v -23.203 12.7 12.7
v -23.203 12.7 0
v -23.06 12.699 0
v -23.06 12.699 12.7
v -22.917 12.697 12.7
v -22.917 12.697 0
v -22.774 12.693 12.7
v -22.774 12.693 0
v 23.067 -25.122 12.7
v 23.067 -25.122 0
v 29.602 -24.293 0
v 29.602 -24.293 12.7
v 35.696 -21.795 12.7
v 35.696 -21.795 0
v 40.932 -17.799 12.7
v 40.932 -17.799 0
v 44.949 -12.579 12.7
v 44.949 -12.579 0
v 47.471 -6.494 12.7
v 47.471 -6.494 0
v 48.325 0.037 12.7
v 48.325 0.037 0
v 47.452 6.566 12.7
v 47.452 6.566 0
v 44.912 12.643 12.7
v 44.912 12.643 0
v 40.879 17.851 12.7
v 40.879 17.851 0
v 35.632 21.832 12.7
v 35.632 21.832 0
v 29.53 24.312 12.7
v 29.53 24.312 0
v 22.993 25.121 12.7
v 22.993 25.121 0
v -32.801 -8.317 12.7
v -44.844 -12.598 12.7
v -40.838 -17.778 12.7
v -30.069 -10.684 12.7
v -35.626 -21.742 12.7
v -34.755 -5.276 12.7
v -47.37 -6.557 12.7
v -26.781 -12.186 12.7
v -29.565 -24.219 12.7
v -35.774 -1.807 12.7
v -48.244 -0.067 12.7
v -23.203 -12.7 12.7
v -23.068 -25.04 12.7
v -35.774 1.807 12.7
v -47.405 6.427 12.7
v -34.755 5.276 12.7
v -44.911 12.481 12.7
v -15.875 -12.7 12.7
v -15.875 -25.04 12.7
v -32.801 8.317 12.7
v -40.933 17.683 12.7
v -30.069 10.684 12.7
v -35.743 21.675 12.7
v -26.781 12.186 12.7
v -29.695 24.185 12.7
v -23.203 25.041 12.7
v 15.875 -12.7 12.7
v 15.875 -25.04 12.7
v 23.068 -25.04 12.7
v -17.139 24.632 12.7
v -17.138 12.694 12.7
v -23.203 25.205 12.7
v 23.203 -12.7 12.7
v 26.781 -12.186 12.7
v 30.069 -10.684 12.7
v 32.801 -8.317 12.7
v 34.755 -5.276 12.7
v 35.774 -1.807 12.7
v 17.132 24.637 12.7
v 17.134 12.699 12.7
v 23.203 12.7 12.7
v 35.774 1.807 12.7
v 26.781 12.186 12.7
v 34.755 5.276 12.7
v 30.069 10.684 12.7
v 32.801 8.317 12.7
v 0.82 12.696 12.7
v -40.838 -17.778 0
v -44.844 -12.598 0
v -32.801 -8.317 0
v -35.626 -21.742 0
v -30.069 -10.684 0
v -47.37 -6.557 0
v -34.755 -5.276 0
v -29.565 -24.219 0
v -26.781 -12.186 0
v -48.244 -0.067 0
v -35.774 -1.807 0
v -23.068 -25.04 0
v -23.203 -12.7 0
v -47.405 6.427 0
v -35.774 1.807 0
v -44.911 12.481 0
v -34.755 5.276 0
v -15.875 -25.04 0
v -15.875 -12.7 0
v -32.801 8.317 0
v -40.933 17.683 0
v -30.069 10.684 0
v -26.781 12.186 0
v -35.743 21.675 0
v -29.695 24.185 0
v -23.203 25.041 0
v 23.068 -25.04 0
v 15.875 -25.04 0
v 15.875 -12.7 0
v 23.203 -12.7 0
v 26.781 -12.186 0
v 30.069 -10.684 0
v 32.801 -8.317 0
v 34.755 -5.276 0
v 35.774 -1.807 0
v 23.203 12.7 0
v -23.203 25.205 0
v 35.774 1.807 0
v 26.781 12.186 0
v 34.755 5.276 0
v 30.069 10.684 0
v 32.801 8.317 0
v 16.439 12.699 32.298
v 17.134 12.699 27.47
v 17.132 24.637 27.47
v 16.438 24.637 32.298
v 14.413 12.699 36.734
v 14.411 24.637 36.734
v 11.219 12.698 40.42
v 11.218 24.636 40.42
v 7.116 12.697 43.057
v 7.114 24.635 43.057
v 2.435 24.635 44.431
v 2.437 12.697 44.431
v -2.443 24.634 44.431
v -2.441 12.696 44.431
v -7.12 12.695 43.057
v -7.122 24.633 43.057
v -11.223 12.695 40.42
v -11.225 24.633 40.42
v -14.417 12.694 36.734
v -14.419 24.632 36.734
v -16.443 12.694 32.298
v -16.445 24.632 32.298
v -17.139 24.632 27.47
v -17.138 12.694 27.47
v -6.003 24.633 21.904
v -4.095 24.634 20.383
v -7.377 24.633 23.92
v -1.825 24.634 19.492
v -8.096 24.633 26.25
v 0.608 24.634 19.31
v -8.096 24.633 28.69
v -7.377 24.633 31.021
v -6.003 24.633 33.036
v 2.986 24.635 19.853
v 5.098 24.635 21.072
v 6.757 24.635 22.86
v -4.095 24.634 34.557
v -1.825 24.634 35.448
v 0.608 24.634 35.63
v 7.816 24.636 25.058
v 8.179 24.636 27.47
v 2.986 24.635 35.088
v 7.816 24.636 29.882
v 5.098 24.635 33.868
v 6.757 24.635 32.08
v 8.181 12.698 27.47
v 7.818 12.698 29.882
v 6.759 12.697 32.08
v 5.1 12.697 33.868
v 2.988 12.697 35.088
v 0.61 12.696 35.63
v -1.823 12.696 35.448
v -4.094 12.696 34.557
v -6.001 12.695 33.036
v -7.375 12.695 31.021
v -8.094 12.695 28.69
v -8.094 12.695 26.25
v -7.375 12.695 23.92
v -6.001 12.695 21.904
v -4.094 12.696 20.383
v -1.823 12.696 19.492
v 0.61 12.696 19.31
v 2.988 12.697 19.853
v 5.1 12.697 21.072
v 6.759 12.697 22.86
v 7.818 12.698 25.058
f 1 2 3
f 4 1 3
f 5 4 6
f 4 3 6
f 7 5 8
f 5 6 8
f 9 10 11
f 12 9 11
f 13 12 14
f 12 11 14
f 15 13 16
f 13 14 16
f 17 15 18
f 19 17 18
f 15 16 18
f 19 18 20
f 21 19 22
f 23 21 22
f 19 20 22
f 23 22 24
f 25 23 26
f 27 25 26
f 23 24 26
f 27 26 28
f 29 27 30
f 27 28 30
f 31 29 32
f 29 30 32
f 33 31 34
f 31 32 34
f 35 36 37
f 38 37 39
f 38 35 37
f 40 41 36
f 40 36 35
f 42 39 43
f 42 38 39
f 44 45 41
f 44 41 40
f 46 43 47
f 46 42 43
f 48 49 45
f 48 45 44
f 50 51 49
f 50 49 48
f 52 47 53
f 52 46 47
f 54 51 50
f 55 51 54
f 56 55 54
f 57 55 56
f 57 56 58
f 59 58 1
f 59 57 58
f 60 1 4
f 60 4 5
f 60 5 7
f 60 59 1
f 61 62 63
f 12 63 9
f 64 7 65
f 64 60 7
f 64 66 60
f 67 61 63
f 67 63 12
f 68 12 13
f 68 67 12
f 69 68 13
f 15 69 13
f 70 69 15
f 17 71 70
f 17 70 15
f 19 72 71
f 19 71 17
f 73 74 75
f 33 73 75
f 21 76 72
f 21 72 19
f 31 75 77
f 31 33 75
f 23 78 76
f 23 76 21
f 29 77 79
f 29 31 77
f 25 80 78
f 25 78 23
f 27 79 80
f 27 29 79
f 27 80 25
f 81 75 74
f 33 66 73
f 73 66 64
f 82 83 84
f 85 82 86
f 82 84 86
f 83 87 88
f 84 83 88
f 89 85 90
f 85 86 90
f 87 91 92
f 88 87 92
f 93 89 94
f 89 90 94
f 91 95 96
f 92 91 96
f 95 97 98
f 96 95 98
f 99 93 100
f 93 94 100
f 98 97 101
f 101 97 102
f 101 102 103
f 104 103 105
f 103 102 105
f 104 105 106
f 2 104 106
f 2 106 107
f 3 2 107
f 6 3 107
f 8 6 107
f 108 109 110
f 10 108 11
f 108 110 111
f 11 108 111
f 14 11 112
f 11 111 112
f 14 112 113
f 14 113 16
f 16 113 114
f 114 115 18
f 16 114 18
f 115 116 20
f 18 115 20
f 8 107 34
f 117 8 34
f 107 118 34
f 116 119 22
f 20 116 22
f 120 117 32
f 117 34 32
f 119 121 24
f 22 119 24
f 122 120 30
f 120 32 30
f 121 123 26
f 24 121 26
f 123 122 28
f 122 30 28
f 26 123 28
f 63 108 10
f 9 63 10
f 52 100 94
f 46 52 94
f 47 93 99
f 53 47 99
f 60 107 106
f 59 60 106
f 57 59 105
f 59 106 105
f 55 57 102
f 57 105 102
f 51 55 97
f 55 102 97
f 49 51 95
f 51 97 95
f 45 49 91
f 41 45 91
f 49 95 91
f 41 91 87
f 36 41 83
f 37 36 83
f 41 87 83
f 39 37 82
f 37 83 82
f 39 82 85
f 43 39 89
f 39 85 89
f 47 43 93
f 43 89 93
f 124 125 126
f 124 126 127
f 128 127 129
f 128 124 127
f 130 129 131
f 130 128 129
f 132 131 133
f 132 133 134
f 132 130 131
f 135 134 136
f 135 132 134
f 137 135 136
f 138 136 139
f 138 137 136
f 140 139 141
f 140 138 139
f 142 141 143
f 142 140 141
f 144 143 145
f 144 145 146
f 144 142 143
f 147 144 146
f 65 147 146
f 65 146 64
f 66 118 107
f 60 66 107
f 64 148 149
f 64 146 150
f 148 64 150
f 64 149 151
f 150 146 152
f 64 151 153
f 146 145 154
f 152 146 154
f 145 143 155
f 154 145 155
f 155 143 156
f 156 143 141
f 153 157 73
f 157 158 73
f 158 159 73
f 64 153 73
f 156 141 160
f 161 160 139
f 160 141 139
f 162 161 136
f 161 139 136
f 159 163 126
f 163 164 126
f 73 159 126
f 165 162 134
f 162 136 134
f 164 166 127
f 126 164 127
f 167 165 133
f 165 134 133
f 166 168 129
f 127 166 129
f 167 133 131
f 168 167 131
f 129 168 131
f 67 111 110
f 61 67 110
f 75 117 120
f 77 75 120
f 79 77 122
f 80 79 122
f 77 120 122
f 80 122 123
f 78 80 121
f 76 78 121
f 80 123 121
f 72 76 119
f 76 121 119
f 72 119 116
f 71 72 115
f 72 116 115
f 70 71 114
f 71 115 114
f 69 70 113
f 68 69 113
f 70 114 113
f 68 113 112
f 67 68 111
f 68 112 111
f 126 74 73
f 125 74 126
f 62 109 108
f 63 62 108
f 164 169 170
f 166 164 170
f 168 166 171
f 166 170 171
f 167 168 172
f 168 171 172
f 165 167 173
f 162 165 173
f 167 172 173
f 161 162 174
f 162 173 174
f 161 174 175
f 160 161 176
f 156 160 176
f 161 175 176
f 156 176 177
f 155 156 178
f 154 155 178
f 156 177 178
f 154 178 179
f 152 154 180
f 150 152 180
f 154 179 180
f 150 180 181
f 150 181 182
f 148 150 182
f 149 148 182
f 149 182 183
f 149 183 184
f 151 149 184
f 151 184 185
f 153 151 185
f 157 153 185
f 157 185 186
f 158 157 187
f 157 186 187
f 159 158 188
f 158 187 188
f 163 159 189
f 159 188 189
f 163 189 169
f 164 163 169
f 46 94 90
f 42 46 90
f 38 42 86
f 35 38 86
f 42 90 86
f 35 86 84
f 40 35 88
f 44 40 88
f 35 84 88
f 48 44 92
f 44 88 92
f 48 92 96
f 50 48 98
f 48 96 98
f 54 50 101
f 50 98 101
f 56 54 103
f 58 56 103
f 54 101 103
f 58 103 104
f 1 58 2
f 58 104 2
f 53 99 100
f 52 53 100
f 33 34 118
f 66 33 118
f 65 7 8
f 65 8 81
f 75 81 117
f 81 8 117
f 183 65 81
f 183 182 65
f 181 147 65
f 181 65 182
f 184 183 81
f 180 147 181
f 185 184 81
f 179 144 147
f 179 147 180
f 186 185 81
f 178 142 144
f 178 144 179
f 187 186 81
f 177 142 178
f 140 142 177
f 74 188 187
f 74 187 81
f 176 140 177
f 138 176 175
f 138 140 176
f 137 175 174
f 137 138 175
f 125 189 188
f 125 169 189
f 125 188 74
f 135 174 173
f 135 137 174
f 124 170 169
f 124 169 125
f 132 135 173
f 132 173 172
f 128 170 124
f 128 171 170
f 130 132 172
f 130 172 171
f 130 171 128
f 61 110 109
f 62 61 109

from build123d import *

# Parameters (mm, degrees)
F1_DEPTH = 12.7
F2_R     = 8.183106
F3_DEPTH = 11.938


with BuildPart() as f1:
    # F0 (on Top) → F1 (new body)
    with BuildSketch(Plane.XY):
        with BuildLine():
            ThreePointArc((-23.2029, -12.7), (-35.9029, 0), (-23.2029, 12.7))
            Line((-23.2029, 12.7), (-23.2029, 25.040741))
            ThreePointArc((-23.2029, 25.040741), (-48.24355, -0.067309), (-23.068282, -25.040379))
            Line((-23.068282, -25.040379), (-15.875, -25.040379))
            Line((-15.875, -25.040379), (-15.875, -12.7))
            Line((-15.875, -12.7), (-23.2029, -12.7))
        make_face()
        with BuildLine():
            Line((-22.774086, 12.692759), (23.2029, 12.7))
            Line((23.2029, 12.7), (22.993142, 25.1211))
            Line((22.993142, 25.1211), (-23.2029, 25.204616))
            Line((-23.2029, 25.204616), (-23.2029, 25.040741))
            Line((-23.2029, 25.040741), (-23.2029, 12.7))
            ThreePointArc((-23.2029, 12.7), (-22.988463, 12.69819), (-22.774086, 12.692759))
        make_face()
        with BuildLine():
            ThreePointArc((23.2029, 12.7), (35.9029, 0), (23.2029, -12.7))
            Line((23.2029, -12.7), (15.875, -12.7))
            Line((15.875, -12.7), (15.875, -25.040379))
            Line((15.875, -25.040379), (23.068282, -25.040379))
            Line((23.068282, -25.040379), (23.067396, -25.12161))
            ThreePointArc((23.067396, -25.12161), (48.324848, 0.037128), (22.993142, 25.1211))
            Line((22.993142, 25.1211), (23.2029, 12.7))
        make_face()
    extrude(amount=F1_DEPTH)

    # F2 (on face) → F3 (join)
    with BuildSketch(Plane(origin=(-0.002, 12.696345, 0), x_dir=(1, 0.000158, 0), z_dir=(0.000158, -1, 0))):
        with BuildLine():
            Line((17.135601, 12.7), (17.135601, 27.470101))
            ThreePointArc((17.135601, 27.470101), (0, 44.605702), (-17.135601, 27.470101))
            Line((-17.135601, 27.470101), (-17.135601, 12.7))
            Line((-17.135601, 12.7), (17.135601, 12.7))
        make_face()
        with Locations((0, 27.470101)):
            Circle(F2_R, mode=Mode.SUBTRACT)
    extrude(amount=-F3_DEPTH)


solid = f1.part
